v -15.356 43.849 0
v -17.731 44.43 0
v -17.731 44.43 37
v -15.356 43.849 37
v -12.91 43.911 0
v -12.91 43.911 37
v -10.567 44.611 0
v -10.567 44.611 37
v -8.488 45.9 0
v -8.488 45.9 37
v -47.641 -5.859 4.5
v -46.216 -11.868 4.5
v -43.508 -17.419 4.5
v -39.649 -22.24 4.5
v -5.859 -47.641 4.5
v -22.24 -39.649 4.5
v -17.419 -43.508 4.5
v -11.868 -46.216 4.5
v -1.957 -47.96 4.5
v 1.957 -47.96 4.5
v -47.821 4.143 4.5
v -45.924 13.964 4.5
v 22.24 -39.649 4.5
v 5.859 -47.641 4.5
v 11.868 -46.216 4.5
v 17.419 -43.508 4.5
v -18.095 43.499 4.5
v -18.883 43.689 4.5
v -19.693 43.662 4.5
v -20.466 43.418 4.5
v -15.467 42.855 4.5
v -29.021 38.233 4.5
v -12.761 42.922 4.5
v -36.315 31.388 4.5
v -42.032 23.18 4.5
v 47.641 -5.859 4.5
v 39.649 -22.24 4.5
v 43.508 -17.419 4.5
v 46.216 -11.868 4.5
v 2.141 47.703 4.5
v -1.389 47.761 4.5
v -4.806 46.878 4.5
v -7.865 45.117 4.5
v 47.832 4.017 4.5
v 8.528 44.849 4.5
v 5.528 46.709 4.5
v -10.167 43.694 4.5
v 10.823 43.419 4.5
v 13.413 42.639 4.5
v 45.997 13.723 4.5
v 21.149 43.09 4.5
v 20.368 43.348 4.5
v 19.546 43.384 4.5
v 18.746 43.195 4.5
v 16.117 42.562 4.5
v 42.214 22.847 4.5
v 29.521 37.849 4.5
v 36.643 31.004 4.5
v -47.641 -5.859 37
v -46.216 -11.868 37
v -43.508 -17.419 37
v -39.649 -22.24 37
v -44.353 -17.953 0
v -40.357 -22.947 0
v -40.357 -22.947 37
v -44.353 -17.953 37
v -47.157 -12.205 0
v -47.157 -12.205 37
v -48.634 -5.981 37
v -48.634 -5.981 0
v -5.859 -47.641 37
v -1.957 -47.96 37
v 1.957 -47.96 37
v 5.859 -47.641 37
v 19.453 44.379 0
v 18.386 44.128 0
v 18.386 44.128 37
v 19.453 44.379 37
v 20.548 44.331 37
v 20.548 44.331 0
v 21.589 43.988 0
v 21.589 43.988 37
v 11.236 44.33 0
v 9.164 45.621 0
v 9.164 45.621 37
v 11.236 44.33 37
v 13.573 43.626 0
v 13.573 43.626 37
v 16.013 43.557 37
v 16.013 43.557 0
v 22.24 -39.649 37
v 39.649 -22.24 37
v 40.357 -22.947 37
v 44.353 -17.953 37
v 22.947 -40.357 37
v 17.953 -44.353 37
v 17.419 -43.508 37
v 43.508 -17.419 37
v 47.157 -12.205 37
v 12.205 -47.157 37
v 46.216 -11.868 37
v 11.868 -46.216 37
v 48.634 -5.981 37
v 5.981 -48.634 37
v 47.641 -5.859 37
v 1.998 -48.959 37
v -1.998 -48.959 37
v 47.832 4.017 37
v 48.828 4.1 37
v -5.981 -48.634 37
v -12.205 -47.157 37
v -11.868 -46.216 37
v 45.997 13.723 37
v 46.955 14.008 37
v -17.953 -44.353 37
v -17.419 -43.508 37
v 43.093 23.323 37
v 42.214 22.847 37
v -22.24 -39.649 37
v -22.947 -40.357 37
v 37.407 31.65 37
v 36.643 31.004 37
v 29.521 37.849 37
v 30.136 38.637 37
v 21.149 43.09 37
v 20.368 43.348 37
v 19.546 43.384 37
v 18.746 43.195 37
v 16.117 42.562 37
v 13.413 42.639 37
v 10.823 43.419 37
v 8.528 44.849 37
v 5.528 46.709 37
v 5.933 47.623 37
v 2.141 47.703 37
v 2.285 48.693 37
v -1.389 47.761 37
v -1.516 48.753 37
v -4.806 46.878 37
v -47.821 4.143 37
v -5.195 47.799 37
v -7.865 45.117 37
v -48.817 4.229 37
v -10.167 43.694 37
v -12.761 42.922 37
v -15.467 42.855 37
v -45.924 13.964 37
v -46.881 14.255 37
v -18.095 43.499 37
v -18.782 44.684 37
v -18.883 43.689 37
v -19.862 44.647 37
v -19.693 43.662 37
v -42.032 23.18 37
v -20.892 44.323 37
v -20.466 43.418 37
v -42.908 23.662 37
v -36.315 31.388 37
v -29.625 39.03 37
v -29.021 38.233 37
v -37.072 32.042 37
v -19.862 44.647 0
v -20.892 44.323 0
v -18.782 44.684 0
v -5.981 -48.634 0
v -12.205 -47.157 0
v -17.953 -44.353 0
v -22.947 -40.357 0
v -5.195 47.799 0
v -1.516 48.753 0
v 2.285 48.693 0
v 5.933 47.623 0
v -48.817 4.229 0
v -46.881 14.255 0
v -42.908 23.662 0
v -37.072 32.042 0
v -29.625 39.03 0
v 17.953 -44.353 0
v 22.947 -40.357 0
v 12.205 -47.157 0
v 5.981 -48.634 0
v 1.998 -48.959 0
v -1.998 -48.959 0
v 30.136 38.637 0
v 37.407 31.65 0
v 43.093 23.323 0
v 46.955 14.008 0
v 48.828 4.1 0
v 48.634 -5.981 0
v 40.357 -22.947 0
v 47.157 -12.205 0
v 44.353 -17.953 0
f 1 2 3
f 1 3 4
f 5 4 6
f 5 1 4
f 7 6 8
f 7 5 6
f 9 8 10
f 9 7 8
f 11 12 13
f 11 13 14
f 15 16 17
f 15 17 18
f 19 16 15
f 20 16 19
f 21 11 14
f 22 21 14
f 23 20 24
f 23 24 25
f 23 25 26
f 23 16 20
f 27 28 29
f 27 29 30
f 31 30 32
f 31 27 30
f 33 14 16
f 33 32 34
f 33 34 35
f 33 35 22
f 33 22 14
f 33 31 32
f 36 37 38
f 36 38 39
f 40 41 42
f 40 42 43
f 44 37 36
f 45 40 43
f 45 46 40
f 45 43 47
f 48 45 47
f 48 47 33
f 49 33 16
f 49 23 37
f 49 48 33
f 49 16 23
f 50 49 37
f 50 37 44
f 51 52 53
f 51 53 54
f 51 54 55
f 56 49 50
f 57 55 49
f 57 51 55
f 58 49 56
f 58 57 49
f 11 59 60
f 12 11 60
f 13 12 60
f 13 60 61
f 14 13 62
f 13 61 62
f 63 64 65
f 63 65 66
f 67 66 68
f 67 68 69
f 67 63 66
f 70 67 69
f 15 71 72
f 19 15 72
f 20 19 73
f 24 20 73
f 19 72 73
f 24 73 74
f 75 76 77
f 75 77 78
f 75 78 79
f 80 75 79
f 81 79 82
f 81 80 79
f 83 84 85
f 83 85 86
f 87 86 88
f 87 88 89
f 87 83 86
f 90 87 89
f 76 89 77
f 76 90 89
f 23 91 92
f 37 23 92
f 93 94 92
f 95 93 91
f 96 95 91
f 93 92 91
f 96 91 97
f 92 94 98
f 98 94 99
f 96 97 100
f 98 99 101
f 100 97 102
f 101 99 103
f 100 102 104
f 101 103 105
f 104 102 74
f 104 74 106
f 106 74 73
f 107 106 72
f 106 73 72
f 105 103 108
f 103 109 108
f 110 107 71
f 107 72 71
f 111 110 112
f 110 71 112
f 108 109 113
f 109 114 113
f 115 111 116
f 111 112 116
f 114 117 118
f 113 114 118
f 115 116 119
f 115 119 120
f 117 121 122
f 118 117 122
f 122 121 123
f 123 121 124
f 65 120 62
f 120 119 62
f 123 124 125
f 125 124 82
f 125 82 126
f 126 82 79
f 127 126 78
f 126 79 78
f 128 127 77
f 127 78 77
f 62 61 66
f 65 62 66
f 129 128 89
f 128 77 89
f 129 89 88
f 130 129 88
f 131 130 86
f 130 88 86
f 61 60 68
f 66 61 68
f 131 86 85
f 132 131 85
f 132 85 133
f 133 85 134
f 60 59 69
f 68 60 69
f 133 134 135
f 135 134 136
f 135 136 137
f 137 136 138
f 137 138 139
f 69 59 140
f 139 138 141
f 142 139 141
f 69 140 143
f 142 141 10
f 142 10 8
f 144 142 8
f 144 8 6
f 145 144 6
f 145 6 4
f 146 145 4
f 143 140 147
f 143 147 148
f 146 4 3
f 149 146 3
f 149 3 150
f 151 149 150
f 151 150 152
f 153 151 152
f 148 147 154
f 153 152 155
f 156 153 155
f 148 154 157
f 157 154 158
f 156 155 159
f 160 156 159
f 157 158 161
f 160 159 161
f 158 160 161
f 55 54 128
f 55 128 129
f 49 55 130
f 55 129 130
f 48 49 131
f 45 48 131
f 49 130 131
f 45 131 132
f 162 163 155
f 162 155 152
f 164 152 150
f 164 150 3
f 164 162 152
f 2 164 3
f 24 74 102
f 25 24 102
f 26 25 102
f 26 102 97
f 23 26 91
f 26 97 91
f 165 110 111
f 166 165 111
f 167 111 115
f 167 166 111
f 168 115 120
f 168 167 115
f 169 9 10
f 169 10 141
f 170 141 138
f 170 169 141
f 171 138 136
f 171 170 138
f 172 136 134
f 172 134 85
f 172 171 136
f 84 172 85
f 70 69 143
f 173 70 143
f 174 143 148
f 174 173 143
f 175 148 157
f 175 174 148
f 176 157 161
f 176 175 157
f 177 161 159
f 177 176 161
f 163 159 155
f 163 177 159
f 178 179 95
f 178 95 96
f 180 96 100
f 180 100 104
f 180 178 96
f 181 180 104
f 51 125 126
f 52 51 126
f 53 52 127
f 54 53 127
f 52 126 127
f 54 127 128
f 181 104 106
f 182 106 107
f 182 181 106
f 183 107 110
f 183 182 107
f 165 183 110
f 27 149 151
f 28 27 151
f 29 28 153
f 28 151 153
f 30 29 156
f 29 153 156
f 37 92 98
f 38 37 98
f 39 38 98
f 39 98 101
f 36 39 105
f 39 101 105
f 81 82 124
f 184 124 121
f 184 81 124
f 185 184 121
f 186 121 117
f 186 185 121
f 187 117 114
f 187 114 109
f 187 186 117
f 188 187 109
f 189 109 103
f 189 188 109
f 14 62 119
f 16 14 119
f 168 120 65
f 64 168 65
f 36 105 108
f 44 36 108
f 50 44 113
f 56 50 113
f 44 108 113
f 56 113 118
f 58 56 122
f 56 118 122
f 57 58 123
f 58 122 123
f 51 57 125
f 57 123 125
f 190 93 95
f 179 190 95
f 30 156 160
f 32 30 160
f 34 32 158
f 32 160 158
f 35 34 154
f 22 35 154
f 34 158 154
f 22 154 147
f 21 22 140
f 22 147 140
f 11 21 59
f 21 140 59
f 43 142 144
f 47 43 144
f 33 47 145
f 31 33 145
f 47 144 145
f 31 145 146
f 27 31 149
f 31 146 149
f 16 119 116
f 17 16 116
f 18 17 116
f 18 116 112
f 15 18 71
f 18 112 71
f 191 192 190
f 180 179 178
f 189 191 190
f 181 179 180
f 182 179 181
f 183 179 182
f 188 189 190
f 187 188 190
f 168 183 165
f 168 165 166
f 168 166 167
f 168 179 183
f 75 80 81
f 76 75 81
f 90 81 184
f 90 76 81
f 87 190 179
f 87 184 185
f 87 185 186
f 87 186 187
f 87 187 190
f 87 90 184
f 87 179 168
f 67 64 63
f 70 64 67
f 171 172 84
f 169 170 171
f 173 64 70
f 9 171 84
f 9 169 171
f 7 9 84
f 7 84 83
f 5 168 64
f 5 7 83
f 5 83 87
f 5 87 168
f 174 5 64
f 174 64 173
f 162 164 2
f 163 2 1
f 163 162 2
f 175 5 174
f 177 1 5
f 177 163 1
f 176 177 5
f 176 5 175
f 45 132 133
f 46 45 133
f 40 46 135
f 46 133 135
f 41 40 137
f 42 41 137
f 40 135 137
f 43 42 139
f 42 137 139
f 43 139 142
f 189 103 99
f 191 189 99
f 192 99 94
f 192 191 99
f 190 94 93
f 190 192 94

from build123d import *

# Parameters (mm, degrees)
BOSS_EXTRUDE1_DEPTH = 37
CUT_EXTRUDE1_DEPTH  = 32.5


with BuildPart() as part:
    # Sketch1 → Boss-Extrude1 (new body)
    with BuildSketch(Plane.XY):
        with BuildLine():
            Line((40.356535193, -22.947426174), (22.947426174, -40.356535193))
            ThreePointArc((22.947426174, -40.356535193), (15.156681171, -45.914203278), (5.981257322, -48.63357442))
            ThreePointArc((5.981257322, -48.63357442), (0, -49), (-5.981257322, -48.63357442))
            ThreePointArc((-5.981257322, -48.63357442), (-15.156681171, -45.914203278), (-22.947426174, -40.356535193))
            Line((-22.947426174, -40.356535193), (-40.356535193, -22.947426174))
            ThreePointArc((-40.356535193, -22.947426174), (-45.914203278, -15.156681171), (-48.63357442, -5.981257322))
            ThreePointArc((-48.63357442, -5.981257322), (-42.907888217, 23.662483572), (-20.892307913, 44.322809817))
            ThreePointArc((-20.892307913, 44.322809817), (-19.322951214, 44.702303901), (-17.73141344, 44.430451502))
            ThreePointArc((-17.73141344, 44.430451502), (-12.910393927, 43.910800792), (-8.488178405, 45.899839725))
            ThreePointArc((-8.488178405, 45.899839725), (0.386708758, 48.850803922), (9.16390657, 45.62084875))
            ThreePointArc((9.16390657, 45.62084875), (13.572775182, 43.625772556), (18.385878971, 44.128249799))
            ThreePointArc((18.385878971, 44.128249799), (20.002215513, 44.392928913), (21.589134046, 43.987603835))
            ThreePointArc((21.589134046, 43.987603835), (43.093258956, 23.323186587), (48.63357442, -5.981257322))
            ThreePointArc((48.63357442, -5.981257322), (45.914203278, -15.156681171), (40.356535193, -22.947426174))
        make_face()
    extrude(amount=BOSS_EXTRUDE1_DEPTH)

    # Sketch3 → Cut-Extrude1 (cut)
    with BuildSketch(Plane.XY.offset(37)):
        with BuildLine():
            Line((-39.649428412, -22.240319392), (-22.240319392, -39.649428412))
            ThreePointArc((-22.240319392, -39.649428412), (-14.718220769, -45.015452769), (-5.859190846, -47.641052493))
            ThreePointArc((-5.859190846, -47.641052493), (0, -48), (5.859190846, -47.641052493))
            ThreePointArc((5.859190846, -47.641052493), (14.718220769, -45.015452769), (22.240319392, -39.649428412))
            Line((22.240319392, -39.649428412), (39.649428412, -22.240319392))
            ThreePointArc((39.649428412, -22.240319392), (45.015452769, -14.718220769), (47.641052493, -5.859190846))
            ThreePointArc((47.641052493, -5.859190846), (42.213804691, 22.847203188), (21.148539474, 43.089897634))
            ThreePointArc((21.148539474, 43.089897634), (19.958350574, 43.393891443), (18.746098167, 43.195382107))
            ThreePointArc((18.746098167, 43.195382107), (13.413001918, 42.638618817), (8.52781313, 44.849236713))
            ThreePointArc((8.52781313, 44.849236713), (0.378047137, 47.850813988), (-7.865478644, 45.117238565))
            ThreePointArc((-7.865478644, 45.117238565), (-12.761098878, 42.921980343), (-18.095263428, 43.498993941))
            ThreePointArc((-18.095263428, 43.498993941), (-19.288916758, 43.702883241), (-20.465934283, 43.418262678))
            ThreePointArc((-20.465934283, 43.418262678), (-42.032217029, 23.179575744), (-47.641052493, -5.859190846))
            ThreePointArc((-47.641052493, -5.859190846), (-45.015452769, -14.718220769), (-39.649428412, -22.240319392))
        make_face()
    extrude(amount=-CUT_EXTRUDE1_DEPTH, mode=Mode.SUBTRACT)


solid = part.part
